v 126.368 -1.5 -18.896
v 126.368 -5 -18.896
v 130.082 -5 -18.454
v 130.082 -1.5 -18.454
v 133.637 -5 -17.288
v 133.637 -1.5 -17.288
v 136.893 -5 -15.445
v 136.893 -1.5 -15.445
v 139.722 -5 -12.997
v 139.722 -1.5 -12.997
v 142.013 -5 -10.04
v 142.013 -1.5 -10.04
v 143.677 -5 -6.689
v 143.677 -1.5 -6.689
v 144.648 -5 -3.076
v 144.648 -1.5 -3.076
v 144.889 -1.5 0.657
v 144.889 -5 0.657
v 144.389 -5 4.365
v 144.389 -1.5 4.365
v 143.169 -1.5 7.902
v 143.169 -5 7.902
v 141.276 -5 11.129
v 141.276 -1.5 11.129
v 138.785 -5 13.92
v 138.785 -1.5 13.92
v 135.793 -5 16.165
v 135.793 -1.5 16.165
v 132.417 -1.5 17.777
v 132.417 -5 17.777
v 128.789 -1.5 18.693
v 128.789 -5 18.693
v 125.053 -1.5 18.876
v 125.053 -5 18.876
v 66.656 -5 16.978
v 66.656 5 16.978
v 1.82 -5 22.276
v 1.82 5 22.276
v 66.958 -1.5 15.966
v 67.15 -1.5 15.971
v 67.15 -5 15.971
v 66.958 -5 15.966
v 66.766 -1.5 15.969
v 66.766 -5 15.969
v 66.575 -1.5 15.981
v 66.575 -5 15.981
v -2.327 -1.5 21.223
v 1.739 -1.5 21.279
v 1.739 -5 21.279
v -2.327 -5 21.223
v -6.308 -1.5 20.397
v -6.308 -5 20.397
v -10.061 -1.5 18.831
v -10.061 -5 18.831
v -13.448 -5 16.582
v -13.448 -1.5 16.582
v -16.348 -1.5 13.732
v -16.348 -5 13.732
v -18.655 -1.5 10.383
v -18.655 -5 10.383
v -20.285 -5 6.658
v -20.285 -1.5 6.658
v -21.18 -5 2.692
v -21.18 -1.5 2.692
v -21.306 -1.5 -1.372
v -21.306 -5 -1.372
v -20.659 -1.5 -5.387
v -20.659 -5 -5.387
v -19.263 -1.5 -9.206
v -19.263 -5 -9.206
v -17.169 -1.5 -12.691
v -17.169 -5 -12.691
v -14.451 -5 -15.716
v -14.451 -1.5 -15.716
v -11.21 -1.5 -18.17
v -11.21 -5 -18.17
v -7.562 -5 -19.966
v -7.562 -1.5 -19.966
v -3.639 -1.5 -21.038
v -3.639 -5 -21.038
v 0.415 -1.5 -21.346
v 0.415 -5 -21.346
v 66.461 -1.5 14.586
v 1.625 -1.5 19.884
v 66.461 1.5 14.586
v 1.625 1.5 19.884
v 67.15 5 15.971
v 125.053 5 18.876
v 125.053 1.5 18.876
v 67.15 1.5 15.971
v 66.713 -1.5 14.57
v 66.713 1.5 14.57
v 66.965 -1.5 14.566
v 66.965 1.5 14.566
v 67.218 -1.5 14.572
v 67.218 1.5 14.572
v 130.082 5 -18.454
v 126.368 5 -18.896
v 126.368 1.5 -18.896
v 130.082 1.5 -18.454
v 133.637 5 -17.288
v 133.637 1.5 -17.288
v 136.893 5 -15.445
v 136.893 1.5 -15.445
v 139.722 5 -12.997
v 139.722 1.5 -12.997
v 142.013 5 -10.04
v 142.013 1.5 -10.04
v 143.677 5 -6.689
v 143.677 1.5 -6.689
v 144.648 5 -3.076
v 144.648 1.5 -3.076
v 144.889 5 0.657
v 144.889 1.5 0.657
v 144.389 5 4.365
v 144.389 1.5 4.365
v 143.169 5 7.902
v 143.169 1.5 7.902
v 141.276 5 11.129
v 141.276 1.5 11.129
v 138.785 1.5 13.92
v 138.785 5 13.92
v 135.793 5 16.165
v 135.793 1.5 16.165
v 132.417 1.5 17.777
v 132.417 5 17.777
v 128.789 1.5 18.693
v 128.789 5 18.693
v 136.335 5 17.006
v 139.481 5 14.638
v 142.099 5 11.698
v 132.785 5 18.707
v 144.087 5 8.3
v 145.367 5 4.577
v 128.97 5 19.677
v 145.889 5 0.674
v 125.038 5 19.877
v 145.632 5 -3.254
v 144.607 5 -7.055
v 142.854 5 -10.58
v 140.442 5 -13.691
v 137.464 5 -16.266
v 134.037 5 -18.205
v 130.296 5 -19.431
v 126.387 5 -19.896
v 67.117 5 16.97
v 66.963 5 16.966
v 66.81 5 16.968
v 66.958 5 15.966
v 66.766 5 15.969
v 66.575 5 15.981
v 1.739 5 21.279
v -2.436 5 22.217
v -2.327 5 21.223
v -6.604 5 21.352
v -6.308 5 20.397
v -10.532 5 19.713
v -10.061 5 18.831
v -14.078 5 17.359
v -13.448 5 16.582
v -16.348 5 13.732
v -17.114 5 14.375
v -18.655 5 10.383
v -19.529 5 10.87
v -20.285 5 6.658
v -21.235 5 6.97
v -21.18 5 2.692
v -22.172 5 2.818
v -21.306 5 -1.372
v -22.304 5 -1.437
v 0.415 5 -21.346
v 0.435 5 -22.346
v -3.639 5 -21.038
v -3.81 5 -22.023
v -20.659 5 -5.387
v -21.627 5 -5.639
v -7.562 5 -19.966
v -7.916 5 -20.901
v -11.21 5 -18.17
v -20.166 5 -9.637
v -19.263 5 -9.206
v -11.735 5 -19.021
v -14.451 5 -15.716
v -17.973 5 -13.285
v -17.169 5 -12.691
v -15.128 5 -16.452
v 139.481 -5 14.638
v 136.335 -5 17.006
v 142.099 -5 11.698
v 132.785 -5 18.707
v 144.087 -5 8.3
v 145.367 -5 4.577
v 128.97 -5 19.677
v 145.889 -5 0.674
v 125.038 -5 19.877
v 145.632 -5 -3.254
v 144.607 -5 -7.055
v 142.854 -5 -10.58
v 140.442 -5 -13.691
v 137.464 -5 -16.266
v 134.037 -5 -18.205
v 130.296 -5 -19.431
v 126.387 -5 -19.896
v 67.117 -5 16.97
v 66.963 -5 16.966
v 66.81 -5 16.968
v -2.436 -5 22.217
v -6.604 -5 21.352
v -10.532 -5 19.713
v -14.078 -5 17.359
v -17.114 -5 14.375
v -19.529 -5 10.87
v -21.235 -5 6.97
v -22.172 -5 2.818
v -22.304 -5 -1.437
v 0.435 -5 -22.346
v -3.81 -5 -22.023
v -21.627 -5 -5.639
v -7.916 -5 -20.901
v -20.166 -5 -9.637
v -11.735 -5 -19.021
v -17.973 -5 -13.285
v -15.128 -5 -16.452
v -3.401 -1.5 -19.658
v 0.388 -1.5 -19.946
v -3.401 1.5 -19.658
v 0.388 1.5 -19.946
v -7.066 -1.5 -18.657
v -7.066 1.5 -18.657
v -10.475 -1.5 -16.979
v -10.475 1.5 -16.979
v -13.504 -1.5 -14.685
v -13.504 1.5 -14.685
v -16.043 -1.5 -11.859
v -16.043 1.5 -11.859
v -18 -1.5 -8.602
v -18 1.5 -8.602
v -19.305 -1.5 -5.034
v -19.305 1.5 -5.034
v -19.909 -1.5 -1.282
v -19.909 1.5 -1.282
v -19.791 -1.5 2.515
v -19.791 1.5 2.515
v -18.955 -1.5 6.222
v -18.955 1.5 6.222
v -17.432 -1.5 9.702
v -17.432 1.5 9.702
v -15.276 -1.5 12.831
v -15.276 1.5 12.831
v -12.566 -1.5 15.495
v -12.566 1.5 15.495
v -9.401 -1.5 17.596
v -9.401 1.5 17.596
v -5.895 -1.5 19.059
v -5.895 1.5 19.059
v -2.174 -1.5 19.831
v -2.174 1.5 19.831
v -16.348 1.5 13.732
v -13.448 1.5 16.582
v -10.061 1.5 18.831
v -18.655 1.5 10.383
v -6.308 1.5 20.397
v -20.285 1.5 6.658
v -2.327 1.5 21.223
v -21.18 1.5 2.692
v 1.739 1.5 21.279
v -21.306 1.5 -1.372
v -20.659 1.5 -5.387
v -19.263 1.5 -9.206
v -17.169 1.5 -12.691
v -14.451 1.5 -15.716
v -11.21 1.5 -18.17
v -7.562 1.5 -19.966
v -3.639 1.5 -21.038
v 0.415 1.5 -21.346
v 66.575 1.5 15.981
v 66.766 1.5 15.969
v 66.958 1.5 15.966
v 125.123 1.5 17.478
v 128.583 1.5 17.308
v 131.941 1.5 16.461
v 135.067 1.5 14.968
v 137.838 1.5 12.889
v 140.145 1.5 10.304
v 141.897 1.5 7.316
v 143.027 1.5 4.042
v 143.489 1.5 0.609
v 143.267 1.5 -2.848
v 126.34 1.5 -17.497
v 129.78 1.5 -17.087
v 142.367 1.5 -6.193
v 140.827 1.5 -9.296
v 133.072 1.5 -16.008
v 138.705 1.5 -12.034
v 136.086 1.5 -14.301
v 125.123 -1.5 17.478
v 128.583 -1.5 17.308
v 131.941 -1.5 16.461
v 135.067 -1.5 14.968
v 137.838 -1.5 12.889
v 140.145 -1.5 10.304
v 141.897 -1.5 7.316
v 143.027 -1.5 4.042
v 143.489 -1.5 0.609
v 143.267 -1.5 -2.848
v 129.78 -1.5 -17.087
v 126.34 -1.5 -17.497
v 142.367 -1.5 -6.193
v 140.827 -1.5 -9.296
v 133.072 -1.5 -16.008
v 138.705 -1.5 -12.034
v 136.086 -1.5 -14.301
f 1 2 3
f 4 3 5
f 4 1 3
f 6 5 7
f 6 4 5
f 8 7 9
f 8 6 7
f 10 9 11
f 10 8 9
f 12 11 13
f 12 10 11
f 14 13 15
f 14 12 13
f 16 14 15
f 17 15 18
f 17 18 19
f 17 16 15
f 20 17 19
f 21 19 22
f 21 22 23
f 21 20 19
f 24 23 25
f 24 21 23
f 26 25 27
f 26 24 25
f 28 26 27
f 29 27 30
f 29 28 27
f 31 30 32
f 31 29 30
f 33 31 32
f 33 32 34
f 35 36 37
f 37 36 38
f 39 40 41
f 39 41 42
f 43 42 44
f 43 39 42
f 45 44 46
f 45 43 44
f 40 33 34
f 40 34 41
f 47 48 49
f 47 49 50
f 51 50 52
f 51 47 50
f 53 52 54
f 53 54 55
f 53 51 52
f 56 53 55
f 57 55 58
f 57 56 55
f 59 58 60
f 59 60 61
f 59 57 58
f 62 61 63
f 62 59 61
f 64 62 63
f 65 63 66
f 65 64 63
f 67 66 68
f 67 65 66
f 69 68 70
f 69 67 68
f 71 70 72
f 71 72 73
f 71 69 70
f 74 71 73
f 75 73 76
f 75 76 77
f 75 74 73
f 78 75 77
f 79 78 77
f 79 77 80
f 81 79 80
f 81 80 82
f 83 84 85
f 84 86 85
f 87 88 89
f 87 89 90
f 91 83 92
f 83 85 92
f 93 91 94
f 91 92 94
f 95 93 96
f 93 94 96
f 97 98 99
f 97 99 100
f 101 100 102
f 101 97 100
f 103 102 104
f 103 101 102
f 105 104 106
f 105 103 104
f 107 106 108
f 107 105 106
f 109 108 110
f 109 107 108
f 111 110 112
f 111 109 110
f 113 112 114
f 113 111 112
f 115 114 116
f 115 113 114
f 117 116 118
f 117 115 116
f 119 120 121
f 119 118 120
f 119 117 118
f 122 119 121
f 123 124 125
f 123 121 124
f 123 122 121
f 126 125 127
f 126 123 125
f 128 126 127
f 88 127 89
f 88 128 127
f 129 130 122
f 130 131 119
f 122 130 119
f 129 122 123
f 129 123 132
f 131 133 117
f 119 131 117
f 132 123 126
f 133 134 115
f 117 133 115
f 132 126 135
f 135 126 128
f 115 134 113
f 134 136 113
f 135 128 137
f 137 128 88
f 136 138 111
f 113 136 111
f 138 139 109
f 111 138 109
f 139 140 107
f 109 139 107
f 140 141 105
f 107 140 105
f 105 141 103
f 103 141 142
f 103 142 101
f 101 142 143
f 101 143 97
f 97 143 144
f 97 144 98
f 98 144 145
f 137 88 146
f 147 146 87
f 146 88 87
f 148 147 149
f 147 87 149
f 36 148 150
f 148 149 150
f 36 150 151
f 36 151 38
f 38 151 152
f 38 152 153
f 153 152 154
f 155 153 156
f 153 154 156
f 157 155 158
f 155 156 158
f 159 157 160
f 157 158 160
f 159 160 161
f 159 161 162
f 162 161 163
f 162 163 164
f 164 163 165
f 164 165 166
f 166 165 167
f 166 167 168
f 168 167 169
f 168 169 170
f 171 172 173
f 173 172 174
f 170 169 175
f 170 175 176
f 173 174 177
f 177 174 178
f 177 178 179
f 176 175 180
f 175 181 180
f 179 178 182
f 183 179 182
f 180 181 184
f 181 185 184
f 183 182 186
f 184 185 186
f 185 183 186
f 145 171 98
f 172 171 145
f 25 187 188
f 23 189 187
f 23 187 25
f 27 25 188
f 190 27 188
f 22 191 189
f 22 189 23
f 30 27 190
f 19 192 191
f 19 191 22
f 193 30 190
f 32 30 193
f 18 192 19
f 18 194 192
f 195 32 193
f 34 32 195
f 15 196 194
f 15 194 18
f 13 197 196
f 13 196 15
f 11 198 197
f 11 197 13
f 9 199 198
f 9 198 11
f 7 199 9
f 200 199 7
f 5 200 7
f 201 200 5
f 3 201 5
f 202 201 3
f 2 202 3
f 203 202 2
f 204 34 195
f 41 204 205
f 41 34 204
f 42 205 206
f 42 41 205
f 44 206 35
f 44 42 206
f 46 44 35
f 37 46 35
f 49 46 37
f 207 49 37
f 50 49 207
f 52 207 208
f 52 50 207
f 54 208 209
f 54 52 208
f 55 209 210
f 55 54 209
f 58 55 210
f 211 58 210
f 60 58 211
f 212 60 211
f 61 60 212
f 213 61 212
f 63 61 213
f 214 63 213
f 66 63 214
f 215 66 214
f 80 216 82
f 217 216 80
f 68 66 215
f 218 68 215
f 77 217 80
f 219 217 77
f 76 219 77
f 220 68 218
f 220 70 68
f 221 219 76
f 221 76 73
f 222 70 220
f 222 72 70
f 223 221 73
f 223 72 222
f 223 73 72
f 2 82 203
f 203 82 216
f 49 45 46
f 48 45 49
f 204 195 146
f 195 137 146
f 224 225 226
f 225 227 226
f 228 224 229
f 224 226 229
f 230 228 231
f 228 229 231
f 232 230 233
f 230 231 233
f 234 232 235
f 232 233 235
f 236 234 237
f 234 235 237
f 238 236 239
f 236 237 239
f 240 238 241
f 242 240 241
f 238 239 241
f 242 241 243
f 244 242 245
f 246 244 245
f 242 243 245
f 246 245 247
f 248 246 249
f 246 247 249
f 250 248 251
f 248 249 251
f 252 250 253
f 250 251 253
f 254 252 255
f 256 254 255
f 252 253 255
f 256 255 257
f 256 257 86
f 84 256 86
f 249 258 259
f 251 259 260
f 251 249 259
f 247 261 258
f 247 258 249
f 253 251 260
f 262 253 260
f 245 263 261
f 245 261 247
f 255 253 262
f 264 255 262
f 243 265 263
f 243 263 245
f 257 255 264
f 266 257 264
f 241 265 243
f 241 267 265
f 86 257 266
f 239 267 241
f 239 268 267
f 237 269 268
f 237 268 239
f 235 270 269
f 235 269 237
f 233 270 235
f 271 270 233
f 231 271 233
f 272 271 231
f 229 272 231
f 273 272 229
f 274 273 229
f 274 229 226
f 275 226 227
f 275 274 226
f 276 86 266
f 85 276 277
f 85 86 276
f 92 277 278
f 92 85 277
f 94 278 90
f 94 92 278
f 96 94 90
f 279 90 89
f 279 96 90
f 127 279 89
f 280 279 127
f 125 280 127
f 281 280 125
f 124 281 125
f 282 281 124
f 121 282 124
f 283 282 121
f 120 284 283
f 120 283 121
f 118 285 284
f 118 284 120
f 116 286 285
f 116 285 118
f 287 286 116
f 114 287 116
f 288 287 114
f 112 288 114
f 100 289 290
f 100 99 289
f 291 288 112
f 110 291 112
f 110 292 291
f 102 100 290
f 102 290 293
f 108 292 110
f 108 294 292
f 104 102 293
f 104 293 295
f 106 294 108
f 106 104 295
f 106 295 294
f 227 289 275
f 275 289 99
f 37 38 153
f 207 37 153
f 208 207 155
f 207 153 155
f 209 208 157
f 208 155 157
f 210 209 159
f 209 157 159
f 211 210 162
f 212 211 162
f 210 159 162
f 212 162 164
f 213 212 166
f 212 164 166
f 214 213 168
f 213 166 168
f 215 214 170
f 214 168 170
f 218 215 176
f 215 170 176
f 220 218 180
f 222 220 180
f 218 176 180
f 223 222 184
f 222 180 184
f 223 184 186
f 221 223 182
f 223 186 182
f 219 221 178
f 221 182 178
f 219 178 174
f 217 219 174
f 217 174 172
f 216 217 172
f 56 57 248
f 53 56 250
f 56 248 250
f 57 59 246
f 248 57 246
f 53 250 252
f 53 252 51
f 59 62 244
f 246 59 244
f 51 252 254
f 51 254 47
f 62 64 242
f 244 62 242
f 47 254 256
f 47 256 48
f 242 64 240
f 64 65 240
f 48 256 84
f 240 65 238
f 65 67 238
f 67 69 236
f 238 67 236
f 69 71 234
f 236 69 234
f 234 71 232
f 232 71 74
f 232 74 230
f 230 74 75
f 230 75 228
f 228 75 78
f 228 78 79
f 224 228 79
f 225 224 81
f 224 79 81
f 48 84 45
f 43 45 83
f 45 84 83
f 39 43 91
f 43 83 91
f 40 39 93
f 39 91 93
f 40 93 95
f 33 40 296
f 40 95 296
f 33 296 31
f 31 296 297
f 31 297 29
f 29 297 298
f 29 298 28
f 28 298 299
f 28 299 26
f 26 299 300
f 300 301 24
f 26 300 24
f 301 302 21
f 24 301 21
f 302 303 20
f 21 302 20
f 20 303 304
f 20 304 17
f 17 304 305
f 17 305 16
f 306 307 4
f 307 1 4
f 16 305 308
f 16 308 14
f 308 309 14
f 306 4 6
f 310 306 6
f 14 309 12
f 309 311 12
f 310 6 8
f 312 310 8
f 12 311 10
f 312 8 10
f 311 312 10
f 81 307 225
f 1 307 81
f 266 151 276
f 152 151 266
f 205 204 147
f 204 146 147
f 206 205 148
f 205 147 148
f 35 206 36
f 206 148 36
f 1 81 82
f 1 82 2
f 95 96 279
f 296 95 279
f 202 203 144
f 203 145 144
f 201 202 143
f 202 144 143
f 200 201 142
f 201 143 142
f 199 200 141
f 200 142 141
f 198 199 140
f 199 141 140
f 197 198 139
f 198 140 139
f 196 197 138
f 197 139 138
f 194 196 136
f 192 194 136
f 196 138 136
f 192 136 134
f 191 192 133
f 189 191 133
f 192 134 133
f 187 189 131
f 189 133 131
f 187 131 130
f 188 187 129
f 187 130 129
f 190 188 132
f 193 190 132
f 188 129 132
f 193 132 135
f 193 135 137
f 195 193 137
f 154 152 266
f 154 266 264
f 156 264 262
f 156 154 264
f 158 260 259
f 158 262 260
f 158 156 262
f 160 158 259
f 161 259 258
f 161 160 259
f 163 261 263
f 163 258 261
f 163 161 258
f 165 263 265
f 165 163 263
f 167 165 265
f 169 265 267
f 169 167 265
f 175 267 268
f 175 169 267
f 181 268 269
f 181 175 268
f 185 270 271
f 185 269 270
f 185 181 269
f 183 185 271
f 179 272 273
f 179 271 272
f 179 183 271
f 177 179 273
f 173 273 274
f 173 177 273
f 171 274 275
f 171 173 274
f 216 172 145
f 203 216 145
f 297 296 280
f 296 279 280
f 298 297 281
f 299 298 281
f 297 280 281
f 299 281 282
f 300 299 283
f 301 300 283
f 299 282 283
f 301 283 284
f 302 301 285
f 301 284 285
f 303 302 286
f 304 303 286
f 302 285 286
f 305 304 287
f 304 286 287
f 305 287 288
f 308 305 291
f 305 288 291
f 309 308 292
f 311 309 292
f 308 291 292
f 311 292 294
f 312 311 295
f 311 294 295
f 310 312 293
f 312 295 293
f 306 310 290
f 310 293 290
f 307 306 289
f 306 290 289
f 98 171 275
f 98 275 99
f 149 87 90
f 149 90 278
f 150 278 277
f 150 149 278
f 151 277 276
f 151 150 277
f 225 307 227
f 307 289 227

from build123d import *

# Parameters (mm, degrees)
BOSS_EXTRUDE1_DEPTH = 5
BOSS_EXTRUDE2_DEPTH = 1.5


with BuildPart() as part:
    # Sketch1 → Boss-Extrude1 (new, symmetric)
    with BuildSketch(Plane(origin=(0, 0, 0), x_dir=(1, 0, 0), z_dir=(0, 1, 0))):
        with BuildLine():
            Line((0.434583333, 22.345774485), (126.386944444, 19.896237684))
            ThreePointArc((126.386944444, 19.896237684), (145.888566517, -0.674478997), (125.038127363, -19.876740201))
            Line((125.038127363, -19.876740201), (67.116731829, -16.970417062))
            ThreePointArc((67.116731829, -16.970417062), (66.886386328, -16.966450661), (66.65627889, -16.977646615))
            Line((66.65627889, -16.977646615), (1.820273578, -22.275751482))
            ThreePointArc((1.820273578, -22.275751482), (-22.339230959, -0.693729175), (0.434583333, 22.345774485))
        make_face()
        with BuildLine():
            Line((0.415138889, 21.345963546), (126.3675, 18.896426746))
            ThreePointArc((126.3675, 18.896426746), (144.88856319, -0.657404457), (125.052845875, -18.876252252))
            Line((125.052845875, -18.876252252), (67.150013324, -15.970860547))
            ThreePointArc((67.150013324, -15.970860547), (66.862262413, -15.966714067), (66.574834882, -15.980968697))
            Line((66.574834882, -15.980968697), (1.73882957, -21.279073564))
            ThreePointArc((1.73882957, -21.279073564), (-21.339712795, -0.662689838), (0.415138889, 21.345963546))
        make_face(mode=Mode.SUBTRACT)
    extrude(amount=BOSS_EXTRUDE1_DEPTH, both=True)

    # Sketch8 → Boss-Extrude2 (add, symmetric)
    with BuildSketch(Plane(origin=(0, 0, 0), x_dir=(1, 0, 0), z_dir=(0, 1, 0))):
        with BuildLine():
            Line((67.1403688, -16.170628229), (125.04282308, -19.076000953))
            ThreePointArc((125.04282308, -19.076000953), (145.088442165, -0.664361118), (126.371388889, 19.096388933))
            Line((126.371388889, 19.096388933), (0.419027778, 21.545925734))
            ThreePointArc((0.419027778, 21.545925734), (-21.539616428, -0.668897706), (1.755118371, -21.478409147))
            Line((1.755118371, -21.478409147), (66.591123683, -16.18030428))
            ThreePointArc((66.591123683, -16.18030428), (66.865591568, -16.166686447), (67.1403688, -16.170628229))
        make_face()
        with BuildLine():
            Line((67.217731767, -14.572497151), (125.12300544, -17.478011344))
            ThreePointArc((125.12300544, -17.478011344), (143.489410361, -0.60870783), (126.340277778, 17.496691431))
            Line((126.340277778, 17.496691431), (0.387916667, 19.946228231))
            ThreePointArc((0.387916667, 19.946228231), (-19.940387366, -0.619234767), (1.624807959, -19.883724478))
            Line((1.624807959, -19.883724478), (66.460813271, -14.58561961))
            ThreePointArc((66.460813271, -14.58561961), (66.839061833, -14.566905785), (67.217731767, -14.572497151))
        make_face(mode=Mode.SUBTRACT)
    extrude(amount=BOSS_EXTRUDE2_DEPTH, both=True)


solid = part.part
